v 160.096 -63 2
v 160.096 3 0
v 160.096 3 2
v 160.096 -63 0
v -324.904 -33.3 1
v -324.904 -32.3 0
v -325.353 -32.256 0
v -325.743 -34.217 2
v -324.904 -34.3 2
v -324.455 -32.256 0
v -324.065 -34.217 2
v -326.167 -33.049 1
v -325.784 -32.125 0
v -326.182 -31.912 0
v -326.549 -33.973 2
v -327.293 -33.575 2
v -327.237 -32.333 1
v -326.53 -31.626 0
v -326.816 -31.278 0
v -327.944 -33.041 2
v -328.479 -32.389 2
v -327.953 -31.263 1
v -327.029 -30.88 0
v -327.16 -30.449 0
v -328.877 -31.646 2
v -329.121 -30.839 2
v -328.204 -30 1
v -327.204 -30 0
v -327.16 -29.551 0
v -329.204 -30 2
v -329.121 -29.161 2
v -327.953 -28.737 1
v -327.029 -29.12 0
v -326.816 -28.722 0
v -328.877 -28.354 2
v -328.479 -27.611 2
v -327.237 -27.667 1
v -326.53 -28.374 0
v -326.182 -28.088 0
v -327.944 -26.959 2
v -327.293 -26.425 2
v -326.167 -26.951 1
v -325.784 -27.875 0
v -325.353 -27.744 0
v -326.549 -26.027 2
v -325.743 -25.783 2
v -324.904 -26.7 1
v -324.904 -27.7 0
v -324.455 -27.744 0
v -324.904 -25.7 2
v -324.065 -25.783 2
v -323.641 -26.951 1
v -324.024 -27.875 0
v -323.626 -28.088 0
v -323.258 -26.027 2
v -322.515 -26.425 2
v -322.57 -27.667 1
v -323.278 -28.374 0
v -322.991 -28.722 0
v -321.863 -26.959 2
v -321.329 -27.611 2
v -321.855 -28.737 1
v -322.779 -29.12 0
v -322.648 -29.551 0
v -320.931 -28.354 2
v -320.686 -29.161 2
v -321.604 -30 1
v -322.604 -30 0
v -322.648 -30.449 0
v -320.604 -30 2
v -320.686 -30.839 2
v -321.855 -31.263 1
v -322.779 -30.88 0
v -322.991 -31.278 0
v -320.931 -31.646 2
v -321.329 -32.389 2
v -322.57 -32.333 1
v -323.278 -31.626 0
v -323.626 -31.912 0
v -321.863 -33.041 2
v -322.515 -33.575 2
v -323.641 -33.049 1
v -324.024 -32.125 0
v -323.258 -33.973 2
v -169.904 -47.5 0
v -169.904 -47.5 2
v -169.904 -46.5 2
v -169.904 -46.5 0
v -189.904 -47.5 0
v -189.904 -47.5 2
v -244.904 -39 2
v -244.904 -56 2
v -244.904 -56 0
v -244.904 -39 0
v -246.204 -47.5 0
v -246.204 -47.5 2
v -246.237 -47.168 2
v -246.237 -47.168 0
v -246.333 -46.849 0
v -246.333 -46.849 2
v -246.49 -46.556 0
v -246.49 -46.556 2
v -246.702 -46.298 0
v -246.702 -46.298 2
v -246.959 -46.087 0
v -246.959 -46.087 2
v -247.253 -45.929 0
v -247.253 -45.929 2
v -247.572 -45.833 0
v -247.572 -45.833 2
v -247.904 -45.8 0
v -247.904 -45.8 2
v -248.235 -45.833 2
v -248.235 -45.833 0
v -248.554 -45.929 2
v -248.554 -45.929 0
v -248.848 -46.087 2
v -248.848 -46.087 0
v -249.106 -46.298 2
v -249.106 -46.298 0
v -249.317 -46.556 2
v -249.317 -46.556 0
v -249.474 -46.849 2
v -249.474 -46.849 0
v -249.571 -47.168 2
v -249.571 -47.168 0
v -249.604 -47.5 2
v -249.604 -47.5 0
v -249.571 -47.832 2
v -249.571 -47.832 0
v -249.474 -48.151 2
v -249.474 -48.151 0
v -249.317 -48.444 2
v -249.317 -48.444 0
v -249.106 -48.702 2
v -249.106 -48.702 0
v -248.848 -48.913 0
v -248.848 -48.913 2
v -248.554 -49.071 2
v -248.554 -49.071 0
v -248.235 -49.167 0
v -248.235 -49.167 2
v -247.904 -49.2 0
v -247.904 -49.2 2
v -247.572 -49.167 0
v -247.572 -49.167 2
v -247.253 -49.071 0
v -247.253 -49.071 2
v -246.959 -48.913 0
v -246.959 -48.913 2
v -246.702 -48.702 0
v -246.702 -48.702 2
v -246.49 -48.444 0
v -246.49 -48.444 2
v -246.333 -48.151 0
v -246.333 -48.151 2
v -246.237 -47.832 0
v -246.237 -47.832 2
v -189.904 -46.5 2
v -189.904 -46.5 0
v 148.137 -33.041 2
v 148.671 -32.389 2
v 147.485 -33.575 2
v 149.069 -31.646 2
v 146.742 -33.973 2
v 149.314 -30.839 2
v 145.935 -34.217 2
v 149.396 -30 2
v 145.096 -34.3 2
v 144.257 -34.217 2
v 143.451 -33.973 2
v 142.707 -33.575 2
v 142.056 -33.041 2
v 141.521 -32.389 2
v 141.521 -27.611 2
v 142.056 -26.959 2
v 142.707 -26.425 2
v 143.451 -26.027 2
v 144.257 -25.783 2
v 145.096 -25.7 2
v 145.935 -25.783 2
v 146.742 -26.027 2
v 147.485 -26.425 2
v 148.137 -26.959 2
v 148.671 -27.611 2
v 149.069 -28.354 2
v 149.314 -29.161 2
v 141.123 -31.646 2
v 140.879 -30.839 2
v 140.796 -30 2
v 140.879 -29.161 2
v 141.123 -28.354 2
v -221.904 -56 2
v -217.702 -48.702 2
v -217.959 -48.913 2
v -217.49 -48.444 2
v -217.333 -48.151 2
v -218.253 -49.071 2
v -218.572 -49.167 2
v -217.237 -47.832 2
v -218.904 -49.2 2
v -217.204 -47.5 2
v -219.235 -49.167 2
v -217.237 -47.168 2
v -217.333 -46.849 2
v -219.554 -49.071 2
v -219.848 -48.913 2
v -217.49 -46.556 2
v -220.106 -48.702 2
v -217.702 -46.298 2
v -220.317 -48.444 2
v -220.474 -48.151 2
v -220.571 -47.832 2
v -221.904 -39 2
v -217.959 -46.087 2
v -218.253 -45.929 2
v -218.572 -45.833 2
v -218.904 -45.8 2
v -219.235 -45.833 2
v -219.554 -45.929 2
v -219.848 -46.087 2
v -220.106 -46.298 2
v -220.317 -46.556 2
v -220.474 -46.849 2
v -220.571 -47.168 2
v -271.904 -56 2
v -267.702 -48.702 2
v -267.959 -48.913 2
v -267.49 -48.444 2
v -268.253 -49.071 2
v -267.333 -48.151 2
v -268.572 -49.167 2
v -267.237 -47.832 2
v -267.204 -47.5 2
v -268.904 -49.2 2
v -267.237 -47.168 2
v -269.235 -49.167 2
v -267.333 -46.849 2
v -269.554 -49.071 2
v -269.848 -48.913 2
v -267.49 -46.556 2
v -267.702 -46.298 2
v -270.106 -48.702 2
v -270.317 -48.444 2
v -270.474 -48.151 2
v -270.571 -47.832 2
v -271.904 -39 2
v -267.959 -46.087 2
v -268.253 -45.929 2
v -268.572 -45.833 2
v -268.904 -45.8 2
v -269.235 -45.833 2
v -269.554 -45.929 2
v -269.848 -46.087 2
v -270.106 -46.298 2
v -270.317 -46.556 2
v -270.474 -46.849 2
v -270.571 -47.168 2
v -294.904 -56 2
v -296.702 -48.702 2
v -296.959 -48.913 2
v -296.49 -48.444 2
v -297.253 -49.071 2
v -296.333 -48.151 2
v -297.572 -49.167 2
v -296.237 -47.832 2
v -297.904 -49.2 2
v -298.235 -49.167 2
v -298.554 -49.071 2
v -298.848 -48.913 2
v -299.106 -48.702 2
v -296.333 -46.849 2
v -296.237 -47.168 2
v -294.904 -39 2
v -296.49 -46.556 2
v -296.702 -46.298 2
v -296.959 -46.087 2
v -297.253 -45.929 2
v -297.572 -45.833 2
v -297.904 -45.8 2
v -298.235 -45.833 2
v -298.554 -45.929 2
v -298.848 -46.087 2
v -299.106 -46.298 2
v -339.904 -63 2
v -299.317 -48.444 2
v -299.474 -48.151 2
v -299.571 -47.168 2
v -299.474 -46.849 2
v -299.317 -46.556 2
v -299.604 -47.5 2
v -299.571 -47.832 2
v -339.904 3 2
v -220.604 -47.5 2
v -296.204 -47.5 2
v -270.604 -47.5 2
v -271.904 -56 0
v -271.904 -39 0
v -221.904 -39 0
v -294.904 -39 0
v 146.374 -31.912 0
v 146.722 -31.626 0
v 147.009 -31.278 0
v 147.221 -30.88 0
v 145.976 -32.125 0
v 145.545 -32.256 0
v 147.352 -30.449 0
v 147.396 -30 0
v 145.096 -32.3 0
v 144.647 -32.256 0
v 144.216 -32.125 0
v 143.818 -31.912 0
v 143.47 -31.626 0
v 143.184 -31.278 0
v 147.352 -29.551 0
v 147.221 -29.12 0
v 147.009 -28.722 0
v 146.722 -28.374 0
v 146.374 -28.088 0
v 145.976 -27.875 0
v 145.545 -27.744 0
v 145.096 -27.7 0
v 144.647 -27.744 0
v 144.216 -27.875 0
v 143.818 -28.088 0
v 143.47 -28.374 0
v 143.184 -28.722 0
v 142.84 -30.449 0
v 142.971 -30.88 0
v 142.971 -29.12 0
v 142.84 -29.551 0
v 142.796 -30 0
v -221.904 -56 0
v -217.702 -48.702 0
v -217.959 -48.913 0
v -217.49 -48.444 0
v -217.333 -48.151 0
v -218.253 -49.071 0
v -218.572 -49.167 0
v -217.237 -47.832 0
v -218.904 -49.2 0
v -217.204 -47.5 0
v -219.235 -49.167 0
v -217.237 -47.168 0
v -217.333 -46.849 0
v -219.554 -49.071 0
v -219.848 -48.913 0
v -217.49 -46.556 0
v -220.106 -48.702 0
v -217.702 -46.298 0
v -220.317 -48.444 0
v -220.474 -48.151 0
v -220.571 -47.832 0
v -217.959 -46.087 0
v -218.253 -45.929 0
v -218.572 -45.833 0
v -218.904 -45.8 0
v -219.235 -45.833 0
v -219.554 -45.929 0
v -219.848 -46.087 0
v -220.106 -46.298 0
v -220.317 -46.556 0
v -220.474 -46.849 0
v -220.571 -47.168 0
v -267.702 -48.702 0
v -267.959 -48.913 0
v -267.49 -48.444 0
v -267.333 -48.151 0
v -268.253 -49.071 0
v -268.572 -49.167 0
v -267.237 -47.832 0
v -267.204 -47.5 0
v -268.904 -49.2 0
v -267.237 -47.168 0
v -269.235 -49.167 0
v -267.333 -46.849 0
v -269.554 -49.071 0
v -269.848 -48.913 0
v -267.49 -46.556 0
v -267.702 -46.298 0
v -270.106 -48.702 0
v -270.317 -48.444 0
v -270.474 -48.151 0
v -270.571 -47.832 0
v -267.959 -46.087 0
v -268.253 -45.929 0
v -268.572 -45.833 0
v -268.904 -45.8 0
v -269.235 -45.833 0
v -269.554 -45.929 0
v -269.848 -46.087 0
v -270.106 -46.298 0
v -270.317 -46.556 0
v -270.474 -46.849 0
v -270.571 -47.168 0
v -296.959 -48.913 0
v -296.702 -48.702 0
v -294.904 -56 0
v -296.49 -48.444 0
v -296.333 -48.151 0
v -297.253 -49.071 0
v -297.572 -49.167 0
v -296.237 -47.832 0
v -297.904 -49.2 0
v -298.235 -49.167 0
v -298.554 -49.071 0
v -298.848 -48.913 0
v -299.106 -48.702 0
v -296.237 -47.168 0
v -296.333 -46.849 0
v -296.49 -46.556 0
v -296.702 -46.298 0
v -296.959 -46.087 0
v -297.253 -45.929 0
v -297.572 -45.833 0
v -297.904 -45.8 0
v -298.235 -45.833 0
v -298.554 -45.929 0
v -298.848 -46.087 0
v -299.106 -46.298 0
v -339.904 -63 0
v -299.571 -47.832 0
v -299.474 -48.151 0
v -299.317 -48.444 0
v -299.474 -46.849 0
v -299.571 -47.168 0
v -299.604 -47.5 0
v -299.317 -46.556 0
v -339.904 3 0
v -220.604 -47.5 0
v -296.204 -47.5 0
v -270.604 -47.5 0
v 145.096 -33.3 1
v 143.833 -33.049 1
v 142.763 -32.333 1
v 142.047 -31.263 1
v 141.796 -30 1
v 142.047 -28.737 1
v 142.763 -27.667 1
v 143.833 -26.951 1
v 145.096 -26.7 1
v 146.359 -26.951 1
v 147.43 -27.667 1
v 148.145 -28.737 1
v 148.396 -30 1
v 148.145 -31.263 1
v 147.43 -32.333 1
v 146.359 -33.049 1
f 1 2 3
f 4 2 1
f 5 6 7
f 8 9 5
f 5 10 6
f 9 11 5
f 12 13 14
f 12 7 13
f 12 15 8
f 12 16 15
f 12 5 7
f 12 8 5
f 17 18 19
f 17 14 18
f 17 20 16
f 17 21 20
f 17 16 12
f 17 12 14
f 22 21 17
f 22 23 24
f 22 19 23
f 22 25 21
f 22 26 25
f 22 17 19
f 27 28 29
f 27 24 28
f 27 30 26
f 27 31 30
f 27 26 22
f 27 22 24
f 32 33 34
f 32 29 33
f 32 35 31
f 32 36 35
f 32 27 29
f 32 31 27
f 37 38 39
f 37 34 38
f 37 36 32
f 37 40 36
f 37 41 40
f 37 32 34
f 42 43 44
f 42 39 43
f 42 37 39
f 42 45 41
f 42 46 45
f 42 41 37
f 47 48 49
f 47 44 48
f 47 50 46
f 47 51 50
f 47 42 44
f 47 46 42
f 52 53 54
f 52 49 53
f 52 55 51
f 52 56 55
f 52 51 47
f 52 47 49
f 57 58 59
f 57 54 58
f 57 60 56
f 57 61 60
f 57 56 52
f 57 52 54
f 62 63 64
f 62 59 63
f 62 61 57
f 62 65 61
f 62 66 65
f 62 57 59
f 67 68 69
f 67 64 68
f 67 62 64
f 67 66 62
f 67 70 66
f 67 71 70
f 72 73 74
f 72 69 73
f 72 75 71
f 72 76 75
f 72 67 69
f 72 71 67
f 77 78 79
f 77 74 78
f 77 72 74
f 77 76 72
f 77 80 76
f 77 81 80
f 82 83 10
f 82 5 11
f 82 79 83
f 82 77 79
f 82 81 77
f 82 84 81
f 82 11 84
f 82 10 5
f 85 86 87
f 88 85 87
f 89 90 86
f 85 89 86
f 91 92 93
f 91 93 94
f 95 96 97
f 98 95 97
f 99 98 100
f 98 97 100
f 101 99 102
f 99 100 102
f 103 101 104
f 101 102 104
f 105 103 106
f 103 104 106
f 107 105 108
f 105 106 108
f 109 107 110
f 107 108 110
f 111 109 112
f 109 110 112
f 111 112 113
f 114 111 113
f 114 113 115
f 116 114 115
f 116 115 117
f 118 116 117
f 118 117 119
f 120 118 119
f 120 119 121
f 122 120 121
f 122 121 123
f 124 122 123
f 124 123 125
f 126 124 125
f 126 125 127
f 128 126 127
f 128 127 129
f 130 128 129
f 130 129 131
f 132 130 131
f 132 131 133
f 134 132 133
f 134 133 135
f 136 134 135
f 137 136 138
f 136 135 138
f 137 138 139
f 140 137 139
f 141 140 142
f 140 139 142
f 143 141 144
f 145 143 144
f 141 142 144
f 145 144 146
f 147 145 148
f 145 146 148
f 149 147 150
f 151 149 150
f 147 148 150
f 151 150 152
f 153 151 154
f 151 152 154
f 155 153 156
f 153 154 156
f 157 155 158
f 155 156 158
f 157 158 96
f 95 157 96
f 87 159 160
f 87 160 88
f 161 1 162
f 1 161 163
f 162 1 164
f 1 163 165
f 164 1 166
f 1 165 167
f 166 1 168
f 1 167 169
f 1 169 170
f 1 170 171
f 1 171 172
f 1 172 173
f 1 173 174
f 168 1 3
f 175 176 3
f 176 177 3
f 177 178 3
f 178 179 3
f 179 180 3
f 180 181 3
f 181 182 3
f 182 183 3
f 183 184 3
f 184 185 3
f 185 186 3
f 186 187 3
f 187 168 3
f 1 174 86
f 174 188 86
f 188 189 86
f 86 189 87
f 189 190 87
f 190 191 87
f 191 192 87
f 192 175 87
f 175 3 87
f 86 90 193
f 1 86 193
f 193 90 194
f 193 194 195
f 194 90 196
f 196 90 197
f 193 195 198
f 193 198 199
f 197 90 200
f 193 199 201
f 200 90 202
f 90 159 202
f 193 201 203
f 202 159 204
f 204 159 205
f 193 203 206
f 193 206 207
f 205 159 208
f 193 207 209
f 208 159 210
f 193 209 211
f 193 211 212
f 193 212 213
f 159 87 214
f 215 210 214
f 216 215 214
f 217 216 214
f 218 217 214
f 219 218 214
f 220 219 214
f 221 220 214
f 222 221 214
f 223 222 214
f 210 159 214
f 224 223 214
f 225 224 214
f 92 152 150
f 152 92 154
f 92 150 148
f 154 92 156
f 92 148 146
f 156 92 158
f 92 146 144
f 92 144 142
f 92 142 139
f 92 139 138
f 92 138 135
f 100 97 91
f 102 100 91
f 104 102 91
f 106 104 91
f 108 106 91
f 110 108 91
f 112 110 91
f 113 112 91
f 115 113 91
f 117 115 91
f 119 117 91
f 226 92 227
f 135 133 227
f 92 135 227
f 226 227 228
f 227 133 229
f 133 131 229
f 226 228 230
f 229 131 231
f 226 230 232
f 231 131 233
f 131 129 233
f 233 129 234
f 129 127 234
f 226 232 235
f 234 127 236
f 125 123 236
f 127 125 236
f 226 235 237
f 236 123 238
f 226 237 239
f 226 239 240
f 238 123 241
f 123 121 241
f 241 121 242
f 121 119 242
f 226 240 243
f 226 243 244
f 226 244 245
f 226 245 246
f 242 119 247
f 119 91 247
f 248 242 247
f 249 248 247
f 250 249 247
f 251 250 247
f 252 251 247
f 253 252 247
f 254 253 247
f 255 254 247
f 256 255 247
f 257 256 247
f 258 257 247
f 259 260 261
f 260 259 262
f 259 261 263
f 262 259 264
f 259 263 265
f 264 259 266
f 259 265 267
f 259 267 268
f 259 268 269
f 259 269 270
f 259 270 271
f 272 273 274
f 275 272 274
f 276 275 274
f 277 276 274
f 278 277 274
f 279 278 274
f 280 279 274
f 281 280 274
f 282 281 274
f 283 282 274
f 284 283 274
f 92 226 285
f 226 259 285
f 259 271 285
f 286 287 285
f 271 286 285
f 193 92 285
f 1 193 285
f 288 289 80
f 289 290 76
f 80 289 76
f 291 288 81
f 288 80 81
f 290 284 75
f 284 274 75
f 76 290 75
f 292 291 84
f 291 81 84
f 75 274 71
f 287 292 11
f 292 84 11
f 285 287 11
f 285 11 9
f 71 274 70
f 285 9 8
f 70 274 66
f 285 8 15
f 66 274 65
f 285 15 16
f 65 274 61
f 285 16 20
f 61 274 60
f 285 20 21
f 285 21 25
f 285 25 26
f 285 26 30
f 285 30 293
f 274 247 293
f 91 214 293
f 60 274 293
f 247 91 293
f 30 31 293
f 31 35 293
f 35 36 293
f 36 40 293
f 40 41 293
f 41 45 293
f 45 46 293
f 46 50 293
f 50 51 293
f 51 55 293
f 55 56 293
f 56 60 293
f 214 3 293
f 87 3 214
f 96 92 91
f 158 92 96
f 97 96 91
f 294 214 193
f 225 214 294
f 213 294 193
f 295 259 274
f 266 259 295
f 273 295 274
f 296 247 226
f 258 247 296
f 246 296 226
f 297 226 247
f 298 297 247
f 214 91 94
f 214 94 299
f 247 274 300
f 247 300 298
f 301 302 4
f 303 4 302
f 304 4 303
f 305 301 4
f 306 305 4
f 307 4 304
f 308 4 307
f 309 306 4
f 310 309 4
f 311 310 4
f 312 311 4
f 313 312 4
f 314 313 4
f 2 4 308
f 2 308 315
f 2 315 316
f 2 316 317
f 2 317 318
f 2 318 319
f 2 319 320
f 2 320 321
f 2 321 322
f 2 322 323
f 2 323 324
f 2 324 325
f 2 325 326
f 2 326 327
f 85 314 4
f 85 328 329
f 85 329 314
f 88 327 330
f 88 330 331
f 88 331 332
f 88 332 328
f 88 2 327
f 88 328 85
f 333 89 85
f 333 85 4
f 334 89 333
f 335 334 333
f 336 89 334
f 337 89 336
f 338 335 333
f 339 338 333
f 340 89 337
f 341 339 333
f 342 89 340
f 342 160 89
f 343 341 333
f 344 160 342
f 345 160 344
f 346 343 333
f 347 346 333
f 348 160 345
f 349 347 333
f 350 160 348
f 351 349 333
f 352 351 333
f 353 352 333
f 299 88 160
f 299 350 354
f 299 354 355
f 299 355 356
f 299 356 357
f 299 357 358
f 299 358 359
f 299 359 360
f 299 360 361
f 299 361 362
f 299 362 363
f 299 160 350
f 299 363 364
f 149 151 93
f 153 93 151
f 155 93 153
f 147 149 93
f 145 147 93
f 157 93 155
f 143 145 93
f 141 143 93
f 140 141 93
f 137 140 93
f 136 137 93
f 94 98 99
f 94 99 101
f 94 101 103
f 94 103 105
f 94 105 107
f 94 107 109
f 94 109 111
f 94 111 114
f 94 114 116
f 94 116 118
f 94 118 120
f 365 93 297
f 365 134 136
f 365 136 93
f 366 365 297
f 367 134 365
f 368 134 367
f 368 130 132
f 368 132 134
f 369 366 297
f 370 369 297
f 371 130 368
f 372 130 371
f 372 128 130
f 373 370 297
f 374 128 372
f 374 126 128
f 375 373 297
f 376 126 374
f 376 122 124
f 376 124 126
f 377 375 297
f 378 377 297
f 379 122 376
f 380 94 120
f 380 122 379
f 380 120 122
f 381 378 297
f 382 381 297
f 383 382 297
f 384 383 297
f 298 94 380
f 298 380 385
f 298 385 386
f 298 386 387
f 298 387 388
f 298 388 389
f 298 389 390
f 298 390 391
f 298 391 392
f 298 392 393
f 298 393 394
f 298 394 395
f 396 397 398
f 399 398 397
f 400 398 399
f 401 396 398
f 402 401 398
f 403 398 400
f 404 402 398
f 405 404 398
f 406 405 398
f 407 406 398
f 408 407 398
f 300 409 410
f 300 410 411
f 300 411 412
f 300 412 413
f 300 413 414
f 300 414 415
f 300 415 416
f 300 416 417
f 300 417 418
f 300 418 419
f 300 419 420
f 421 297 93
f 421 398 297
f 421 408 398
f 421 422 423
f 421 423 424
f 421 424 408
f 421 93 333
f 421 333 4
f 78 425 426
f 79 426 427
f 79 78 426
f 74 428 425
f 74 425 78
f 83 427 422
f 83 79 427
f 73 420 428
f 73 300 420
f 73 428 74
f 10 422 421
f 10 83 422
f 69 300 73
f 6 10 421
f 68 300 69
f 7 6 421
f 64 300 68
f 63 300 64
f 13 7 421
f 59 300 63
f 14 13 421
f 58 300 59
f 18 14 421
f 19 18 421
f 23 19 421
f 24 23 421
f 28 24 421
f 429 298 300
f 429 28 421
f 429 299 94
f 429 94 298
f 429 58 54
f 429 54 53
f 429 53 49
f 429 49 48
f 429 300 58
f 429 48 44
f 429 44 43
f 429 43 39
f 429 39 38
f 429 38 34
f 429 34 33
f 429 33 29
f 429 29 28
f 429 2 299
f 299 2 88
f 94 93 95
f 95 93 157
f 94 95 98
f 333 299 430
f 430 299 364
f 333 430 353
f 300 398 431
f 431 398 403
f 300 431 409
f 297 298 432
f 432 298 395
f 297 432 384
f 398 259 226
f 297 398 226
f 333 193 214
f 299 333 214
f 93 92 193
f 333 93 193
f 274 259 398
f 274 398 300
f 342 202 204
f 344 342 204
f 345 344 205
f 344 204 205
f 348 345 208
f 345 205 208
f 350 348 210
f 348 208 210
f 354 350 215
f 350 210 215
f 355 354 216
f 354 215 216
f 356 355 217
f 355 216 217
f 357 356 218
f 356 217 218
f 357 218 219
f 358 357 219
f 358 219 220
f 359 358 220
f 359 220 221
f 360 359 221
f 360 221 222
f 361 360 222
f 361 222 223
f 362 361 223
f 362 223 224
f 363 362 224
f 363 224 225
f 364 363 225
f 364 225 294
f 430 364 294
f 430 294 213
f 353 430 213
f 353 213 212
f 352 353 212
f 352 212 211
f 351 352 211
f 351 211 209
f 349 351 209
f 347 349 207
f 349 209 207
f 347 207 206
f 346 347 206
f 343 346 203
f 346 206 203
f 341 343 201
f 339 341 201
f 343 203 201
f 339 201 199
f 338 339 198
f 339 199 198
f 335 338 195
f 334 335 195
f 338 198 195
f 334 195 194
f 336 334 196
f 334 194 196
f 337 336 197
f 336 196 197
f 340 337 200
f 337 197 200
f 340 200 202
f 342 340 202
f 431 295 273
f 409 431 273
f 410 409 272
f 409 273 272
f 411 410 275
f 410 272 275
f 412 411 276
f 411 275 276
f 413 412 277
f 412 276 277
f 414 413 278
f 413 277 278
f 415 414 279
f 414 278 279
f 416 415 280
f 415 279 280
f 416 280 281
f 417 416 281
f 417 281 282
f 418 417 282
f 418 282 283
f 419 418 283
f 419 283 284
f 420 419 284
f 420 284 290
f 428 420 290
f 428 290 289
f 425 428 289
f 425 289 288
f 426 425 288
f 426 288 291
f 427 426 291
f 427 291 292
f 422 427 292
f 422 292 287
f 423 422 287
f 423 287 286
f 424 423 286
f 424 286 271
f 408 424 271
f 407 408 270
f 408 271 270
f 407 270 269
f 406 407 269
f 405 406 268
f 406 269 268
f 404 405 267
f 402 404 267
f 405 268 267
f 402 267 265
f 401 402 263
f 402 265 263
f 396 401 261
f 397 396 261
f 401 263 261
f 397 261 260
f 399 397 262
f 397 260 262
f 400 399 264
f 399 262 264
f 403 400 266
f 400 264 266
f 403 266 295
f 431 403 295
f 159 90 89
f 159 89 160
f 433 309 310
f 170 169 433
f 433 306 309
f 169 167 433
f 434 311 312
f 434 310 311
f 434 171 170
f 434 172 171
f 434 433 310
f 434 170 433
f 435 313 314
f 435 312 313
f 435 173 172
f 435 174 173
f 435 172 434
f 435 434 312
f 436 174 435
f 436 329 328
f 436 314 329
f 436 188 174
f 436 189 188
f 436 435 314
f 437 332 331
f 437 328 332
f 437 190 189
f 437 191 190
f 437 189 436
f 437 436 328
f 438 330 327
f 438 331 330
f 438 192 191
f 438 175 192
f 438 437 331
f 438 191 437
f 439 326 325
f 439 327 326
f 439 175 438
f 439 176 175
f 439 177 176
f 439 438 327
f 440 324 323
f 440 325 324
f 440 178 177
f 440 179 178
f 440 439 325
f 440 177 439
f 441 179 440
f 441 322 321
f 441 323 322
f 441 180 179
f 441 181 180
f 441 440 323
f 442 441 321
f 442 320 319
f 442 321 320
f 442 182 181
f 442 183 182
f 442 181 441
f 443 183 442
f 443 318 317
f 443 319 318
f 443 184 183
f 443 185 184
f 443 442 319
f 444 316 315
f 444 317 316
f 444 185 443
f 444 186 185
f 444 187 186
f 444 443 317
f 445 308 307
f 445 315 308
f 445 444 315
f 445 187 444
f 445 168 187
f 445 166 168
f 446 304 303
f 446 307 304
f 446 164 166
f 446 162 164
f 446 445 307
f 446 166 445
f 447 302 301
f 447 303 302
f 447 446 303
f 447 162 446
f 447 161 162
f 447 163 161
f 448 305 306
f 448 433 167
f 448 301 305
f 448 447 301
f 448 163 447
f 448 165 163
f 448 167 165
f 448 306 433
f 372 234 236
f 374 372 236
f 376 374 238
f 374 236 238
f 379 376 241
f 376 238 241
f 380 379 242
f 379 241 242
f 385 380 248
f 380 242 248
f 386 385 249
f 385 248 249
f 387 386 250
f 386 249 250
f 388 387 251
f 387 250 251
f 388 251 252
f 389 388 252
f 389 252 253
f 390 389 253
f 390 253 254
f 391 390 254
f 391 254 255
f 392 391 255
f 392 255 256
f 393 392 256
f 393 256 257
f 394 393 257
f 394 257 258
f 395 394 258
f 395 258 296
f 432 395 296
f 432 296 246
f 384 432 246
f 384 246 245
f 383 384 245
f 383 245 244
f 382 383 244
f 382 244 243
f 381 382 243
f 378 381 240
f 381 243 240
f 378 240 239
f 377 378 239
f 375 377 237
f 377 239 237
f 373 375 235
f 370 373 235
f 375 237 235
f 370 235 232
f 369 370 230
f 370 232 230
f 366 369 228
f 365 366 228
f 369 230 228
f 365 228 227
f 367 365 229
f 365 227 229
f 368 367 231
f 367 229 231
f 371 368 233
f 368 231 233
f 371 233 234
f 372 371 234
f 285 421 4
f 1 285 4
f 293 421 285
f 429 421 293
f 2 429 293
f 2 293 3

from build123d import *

# Parameters (mm, degrees)
AUFSATZ_LINEAR_AUSTRAGEN1_DEPTH             = 2
FORMSENKUNG_F_R_M4_SENKSCHRAUBE_MIT_2_COUNT = 2
FORMSENKUNG_F_R_M4_SENKSCHRAUBE_MIT_2_PITCH = 470
SKIZZE4_R                                   = 1.7
SKIZZE4_W                                   = 23
SKIZZE4_H                                   = 17
SKIZZE4_W_2                                 = 20
SKIZZE4_H_2                                 = 1
SCHNITT_LINEAR_AUSTRAGEN1_DEPTH             = 10
SKIZZE7_W                                   = 500
SKIZZE7_H                                   = 8
SCHNITT_LINEAR_AUSTRAGEN3_DEPTH             = 10


with BuildPart() as part:
    # Skizze1 → Aufsatz-Linear austragen1 (new body)
    with BuildSketch(Plane.XY):
        Polygon((-339.903846154, 3), (160.096153846, 3), (160.096153846, -63), (130.094653846, -63), (130.094653846, -71), (-309.902346154, -71), (-309.902346154, -63), (-316.903846154, -63), (-339.903846154, -63), align=None)
    extrude(amount=AUFSATZ_LINEAR_AUSTRAGEN1_DEPTH)

    # Skizze3 → Formsenkung für M4 Senkschraube mit Innensechskant1 (revolve, cut)
    with BuildSketch(Plane(origin=(145.096153846, -30, 2), x_dir=(0, -1, 0), z_dir=(1, 0, 0))):
        Polygon((0, 0), (0, 2), (2.25, 2), (2.25, 2.05), (4.3, 0), align=None)
    formsenkung_f_r_m4_senkschraube_mit_inne = revolve(axis=Axis((145.096153846, -30, 8.35), (0, 0, -1)), mode=Mode.SUBTRACT)

    # Formsenkung f_r M4 Senkschraube mit  2: Formsenkung für M4 Senkschraube mit Innensechskant1 ×2
    with Locations(*[(-i * FORMSENKUNG_F_R_M4_SENKSCHRAUBE_MIT_2_PITCH, 0, 0) for i in range(1, FORMSENKUNG_F_R_M4_SENKSCHRAUBE_MIT_2_COUNT)]):
        add(formsenkung_f_r_m4_senkschraube_mit_inne, mode=Mode.SUBTRACT)

    # Skizze4 → Schnitt-Linear austragen1 (cut)
    with BuildSketch(Plane.XY.offset(2)):
        with Locations((-268.903846154, -47.5)):
            Circle(SKIZZE4_R)
        with Locations((-297.903846154, -47.5)):
            Circle(SKIZZE4_R)
        with Locations((-218.903846154, -47.5)):
            Circle(SKIZZE4_R)
        with Locations((-247.903846154, -47.5)):
            Circle(SKIZZE4_R)
        with Locations((-283.403846154, -47.5)):
            Rectangle(SKIZZE4_W, SKIZZE4_H)
        with Locations((-179.903846154, -47)):
            Rectangle(SKIZZE4_W_2, SKIZZE4_H_2)
        with Locations((-233.403846154, -47.5)):
            Rectangle(SKIZZE4_W, SKIZZE4_H)
    extrude(amount=-SCHNITT_LINEAR_AUSTRAGEN1_DEPTH, mode=Mode.SUBTRACT)

    # Skizze7 → Schnitt-Linear austragen3 (cut)
    with BuildSketch(Plane(origin=(0, 0, 0), x_dir=(-1, 0, 0), z_dir=(0, 0, -1))):
        with Locations((89.903846154, -67)):
            Rectangle(SKIZZE7_W, SKIZZE7_H)
    extrude(amount=-SCHNITT_LINEAR_AUSTRAGEN3_DEPTH, mode=Mode.SUBTRACT)


solid = part.part
